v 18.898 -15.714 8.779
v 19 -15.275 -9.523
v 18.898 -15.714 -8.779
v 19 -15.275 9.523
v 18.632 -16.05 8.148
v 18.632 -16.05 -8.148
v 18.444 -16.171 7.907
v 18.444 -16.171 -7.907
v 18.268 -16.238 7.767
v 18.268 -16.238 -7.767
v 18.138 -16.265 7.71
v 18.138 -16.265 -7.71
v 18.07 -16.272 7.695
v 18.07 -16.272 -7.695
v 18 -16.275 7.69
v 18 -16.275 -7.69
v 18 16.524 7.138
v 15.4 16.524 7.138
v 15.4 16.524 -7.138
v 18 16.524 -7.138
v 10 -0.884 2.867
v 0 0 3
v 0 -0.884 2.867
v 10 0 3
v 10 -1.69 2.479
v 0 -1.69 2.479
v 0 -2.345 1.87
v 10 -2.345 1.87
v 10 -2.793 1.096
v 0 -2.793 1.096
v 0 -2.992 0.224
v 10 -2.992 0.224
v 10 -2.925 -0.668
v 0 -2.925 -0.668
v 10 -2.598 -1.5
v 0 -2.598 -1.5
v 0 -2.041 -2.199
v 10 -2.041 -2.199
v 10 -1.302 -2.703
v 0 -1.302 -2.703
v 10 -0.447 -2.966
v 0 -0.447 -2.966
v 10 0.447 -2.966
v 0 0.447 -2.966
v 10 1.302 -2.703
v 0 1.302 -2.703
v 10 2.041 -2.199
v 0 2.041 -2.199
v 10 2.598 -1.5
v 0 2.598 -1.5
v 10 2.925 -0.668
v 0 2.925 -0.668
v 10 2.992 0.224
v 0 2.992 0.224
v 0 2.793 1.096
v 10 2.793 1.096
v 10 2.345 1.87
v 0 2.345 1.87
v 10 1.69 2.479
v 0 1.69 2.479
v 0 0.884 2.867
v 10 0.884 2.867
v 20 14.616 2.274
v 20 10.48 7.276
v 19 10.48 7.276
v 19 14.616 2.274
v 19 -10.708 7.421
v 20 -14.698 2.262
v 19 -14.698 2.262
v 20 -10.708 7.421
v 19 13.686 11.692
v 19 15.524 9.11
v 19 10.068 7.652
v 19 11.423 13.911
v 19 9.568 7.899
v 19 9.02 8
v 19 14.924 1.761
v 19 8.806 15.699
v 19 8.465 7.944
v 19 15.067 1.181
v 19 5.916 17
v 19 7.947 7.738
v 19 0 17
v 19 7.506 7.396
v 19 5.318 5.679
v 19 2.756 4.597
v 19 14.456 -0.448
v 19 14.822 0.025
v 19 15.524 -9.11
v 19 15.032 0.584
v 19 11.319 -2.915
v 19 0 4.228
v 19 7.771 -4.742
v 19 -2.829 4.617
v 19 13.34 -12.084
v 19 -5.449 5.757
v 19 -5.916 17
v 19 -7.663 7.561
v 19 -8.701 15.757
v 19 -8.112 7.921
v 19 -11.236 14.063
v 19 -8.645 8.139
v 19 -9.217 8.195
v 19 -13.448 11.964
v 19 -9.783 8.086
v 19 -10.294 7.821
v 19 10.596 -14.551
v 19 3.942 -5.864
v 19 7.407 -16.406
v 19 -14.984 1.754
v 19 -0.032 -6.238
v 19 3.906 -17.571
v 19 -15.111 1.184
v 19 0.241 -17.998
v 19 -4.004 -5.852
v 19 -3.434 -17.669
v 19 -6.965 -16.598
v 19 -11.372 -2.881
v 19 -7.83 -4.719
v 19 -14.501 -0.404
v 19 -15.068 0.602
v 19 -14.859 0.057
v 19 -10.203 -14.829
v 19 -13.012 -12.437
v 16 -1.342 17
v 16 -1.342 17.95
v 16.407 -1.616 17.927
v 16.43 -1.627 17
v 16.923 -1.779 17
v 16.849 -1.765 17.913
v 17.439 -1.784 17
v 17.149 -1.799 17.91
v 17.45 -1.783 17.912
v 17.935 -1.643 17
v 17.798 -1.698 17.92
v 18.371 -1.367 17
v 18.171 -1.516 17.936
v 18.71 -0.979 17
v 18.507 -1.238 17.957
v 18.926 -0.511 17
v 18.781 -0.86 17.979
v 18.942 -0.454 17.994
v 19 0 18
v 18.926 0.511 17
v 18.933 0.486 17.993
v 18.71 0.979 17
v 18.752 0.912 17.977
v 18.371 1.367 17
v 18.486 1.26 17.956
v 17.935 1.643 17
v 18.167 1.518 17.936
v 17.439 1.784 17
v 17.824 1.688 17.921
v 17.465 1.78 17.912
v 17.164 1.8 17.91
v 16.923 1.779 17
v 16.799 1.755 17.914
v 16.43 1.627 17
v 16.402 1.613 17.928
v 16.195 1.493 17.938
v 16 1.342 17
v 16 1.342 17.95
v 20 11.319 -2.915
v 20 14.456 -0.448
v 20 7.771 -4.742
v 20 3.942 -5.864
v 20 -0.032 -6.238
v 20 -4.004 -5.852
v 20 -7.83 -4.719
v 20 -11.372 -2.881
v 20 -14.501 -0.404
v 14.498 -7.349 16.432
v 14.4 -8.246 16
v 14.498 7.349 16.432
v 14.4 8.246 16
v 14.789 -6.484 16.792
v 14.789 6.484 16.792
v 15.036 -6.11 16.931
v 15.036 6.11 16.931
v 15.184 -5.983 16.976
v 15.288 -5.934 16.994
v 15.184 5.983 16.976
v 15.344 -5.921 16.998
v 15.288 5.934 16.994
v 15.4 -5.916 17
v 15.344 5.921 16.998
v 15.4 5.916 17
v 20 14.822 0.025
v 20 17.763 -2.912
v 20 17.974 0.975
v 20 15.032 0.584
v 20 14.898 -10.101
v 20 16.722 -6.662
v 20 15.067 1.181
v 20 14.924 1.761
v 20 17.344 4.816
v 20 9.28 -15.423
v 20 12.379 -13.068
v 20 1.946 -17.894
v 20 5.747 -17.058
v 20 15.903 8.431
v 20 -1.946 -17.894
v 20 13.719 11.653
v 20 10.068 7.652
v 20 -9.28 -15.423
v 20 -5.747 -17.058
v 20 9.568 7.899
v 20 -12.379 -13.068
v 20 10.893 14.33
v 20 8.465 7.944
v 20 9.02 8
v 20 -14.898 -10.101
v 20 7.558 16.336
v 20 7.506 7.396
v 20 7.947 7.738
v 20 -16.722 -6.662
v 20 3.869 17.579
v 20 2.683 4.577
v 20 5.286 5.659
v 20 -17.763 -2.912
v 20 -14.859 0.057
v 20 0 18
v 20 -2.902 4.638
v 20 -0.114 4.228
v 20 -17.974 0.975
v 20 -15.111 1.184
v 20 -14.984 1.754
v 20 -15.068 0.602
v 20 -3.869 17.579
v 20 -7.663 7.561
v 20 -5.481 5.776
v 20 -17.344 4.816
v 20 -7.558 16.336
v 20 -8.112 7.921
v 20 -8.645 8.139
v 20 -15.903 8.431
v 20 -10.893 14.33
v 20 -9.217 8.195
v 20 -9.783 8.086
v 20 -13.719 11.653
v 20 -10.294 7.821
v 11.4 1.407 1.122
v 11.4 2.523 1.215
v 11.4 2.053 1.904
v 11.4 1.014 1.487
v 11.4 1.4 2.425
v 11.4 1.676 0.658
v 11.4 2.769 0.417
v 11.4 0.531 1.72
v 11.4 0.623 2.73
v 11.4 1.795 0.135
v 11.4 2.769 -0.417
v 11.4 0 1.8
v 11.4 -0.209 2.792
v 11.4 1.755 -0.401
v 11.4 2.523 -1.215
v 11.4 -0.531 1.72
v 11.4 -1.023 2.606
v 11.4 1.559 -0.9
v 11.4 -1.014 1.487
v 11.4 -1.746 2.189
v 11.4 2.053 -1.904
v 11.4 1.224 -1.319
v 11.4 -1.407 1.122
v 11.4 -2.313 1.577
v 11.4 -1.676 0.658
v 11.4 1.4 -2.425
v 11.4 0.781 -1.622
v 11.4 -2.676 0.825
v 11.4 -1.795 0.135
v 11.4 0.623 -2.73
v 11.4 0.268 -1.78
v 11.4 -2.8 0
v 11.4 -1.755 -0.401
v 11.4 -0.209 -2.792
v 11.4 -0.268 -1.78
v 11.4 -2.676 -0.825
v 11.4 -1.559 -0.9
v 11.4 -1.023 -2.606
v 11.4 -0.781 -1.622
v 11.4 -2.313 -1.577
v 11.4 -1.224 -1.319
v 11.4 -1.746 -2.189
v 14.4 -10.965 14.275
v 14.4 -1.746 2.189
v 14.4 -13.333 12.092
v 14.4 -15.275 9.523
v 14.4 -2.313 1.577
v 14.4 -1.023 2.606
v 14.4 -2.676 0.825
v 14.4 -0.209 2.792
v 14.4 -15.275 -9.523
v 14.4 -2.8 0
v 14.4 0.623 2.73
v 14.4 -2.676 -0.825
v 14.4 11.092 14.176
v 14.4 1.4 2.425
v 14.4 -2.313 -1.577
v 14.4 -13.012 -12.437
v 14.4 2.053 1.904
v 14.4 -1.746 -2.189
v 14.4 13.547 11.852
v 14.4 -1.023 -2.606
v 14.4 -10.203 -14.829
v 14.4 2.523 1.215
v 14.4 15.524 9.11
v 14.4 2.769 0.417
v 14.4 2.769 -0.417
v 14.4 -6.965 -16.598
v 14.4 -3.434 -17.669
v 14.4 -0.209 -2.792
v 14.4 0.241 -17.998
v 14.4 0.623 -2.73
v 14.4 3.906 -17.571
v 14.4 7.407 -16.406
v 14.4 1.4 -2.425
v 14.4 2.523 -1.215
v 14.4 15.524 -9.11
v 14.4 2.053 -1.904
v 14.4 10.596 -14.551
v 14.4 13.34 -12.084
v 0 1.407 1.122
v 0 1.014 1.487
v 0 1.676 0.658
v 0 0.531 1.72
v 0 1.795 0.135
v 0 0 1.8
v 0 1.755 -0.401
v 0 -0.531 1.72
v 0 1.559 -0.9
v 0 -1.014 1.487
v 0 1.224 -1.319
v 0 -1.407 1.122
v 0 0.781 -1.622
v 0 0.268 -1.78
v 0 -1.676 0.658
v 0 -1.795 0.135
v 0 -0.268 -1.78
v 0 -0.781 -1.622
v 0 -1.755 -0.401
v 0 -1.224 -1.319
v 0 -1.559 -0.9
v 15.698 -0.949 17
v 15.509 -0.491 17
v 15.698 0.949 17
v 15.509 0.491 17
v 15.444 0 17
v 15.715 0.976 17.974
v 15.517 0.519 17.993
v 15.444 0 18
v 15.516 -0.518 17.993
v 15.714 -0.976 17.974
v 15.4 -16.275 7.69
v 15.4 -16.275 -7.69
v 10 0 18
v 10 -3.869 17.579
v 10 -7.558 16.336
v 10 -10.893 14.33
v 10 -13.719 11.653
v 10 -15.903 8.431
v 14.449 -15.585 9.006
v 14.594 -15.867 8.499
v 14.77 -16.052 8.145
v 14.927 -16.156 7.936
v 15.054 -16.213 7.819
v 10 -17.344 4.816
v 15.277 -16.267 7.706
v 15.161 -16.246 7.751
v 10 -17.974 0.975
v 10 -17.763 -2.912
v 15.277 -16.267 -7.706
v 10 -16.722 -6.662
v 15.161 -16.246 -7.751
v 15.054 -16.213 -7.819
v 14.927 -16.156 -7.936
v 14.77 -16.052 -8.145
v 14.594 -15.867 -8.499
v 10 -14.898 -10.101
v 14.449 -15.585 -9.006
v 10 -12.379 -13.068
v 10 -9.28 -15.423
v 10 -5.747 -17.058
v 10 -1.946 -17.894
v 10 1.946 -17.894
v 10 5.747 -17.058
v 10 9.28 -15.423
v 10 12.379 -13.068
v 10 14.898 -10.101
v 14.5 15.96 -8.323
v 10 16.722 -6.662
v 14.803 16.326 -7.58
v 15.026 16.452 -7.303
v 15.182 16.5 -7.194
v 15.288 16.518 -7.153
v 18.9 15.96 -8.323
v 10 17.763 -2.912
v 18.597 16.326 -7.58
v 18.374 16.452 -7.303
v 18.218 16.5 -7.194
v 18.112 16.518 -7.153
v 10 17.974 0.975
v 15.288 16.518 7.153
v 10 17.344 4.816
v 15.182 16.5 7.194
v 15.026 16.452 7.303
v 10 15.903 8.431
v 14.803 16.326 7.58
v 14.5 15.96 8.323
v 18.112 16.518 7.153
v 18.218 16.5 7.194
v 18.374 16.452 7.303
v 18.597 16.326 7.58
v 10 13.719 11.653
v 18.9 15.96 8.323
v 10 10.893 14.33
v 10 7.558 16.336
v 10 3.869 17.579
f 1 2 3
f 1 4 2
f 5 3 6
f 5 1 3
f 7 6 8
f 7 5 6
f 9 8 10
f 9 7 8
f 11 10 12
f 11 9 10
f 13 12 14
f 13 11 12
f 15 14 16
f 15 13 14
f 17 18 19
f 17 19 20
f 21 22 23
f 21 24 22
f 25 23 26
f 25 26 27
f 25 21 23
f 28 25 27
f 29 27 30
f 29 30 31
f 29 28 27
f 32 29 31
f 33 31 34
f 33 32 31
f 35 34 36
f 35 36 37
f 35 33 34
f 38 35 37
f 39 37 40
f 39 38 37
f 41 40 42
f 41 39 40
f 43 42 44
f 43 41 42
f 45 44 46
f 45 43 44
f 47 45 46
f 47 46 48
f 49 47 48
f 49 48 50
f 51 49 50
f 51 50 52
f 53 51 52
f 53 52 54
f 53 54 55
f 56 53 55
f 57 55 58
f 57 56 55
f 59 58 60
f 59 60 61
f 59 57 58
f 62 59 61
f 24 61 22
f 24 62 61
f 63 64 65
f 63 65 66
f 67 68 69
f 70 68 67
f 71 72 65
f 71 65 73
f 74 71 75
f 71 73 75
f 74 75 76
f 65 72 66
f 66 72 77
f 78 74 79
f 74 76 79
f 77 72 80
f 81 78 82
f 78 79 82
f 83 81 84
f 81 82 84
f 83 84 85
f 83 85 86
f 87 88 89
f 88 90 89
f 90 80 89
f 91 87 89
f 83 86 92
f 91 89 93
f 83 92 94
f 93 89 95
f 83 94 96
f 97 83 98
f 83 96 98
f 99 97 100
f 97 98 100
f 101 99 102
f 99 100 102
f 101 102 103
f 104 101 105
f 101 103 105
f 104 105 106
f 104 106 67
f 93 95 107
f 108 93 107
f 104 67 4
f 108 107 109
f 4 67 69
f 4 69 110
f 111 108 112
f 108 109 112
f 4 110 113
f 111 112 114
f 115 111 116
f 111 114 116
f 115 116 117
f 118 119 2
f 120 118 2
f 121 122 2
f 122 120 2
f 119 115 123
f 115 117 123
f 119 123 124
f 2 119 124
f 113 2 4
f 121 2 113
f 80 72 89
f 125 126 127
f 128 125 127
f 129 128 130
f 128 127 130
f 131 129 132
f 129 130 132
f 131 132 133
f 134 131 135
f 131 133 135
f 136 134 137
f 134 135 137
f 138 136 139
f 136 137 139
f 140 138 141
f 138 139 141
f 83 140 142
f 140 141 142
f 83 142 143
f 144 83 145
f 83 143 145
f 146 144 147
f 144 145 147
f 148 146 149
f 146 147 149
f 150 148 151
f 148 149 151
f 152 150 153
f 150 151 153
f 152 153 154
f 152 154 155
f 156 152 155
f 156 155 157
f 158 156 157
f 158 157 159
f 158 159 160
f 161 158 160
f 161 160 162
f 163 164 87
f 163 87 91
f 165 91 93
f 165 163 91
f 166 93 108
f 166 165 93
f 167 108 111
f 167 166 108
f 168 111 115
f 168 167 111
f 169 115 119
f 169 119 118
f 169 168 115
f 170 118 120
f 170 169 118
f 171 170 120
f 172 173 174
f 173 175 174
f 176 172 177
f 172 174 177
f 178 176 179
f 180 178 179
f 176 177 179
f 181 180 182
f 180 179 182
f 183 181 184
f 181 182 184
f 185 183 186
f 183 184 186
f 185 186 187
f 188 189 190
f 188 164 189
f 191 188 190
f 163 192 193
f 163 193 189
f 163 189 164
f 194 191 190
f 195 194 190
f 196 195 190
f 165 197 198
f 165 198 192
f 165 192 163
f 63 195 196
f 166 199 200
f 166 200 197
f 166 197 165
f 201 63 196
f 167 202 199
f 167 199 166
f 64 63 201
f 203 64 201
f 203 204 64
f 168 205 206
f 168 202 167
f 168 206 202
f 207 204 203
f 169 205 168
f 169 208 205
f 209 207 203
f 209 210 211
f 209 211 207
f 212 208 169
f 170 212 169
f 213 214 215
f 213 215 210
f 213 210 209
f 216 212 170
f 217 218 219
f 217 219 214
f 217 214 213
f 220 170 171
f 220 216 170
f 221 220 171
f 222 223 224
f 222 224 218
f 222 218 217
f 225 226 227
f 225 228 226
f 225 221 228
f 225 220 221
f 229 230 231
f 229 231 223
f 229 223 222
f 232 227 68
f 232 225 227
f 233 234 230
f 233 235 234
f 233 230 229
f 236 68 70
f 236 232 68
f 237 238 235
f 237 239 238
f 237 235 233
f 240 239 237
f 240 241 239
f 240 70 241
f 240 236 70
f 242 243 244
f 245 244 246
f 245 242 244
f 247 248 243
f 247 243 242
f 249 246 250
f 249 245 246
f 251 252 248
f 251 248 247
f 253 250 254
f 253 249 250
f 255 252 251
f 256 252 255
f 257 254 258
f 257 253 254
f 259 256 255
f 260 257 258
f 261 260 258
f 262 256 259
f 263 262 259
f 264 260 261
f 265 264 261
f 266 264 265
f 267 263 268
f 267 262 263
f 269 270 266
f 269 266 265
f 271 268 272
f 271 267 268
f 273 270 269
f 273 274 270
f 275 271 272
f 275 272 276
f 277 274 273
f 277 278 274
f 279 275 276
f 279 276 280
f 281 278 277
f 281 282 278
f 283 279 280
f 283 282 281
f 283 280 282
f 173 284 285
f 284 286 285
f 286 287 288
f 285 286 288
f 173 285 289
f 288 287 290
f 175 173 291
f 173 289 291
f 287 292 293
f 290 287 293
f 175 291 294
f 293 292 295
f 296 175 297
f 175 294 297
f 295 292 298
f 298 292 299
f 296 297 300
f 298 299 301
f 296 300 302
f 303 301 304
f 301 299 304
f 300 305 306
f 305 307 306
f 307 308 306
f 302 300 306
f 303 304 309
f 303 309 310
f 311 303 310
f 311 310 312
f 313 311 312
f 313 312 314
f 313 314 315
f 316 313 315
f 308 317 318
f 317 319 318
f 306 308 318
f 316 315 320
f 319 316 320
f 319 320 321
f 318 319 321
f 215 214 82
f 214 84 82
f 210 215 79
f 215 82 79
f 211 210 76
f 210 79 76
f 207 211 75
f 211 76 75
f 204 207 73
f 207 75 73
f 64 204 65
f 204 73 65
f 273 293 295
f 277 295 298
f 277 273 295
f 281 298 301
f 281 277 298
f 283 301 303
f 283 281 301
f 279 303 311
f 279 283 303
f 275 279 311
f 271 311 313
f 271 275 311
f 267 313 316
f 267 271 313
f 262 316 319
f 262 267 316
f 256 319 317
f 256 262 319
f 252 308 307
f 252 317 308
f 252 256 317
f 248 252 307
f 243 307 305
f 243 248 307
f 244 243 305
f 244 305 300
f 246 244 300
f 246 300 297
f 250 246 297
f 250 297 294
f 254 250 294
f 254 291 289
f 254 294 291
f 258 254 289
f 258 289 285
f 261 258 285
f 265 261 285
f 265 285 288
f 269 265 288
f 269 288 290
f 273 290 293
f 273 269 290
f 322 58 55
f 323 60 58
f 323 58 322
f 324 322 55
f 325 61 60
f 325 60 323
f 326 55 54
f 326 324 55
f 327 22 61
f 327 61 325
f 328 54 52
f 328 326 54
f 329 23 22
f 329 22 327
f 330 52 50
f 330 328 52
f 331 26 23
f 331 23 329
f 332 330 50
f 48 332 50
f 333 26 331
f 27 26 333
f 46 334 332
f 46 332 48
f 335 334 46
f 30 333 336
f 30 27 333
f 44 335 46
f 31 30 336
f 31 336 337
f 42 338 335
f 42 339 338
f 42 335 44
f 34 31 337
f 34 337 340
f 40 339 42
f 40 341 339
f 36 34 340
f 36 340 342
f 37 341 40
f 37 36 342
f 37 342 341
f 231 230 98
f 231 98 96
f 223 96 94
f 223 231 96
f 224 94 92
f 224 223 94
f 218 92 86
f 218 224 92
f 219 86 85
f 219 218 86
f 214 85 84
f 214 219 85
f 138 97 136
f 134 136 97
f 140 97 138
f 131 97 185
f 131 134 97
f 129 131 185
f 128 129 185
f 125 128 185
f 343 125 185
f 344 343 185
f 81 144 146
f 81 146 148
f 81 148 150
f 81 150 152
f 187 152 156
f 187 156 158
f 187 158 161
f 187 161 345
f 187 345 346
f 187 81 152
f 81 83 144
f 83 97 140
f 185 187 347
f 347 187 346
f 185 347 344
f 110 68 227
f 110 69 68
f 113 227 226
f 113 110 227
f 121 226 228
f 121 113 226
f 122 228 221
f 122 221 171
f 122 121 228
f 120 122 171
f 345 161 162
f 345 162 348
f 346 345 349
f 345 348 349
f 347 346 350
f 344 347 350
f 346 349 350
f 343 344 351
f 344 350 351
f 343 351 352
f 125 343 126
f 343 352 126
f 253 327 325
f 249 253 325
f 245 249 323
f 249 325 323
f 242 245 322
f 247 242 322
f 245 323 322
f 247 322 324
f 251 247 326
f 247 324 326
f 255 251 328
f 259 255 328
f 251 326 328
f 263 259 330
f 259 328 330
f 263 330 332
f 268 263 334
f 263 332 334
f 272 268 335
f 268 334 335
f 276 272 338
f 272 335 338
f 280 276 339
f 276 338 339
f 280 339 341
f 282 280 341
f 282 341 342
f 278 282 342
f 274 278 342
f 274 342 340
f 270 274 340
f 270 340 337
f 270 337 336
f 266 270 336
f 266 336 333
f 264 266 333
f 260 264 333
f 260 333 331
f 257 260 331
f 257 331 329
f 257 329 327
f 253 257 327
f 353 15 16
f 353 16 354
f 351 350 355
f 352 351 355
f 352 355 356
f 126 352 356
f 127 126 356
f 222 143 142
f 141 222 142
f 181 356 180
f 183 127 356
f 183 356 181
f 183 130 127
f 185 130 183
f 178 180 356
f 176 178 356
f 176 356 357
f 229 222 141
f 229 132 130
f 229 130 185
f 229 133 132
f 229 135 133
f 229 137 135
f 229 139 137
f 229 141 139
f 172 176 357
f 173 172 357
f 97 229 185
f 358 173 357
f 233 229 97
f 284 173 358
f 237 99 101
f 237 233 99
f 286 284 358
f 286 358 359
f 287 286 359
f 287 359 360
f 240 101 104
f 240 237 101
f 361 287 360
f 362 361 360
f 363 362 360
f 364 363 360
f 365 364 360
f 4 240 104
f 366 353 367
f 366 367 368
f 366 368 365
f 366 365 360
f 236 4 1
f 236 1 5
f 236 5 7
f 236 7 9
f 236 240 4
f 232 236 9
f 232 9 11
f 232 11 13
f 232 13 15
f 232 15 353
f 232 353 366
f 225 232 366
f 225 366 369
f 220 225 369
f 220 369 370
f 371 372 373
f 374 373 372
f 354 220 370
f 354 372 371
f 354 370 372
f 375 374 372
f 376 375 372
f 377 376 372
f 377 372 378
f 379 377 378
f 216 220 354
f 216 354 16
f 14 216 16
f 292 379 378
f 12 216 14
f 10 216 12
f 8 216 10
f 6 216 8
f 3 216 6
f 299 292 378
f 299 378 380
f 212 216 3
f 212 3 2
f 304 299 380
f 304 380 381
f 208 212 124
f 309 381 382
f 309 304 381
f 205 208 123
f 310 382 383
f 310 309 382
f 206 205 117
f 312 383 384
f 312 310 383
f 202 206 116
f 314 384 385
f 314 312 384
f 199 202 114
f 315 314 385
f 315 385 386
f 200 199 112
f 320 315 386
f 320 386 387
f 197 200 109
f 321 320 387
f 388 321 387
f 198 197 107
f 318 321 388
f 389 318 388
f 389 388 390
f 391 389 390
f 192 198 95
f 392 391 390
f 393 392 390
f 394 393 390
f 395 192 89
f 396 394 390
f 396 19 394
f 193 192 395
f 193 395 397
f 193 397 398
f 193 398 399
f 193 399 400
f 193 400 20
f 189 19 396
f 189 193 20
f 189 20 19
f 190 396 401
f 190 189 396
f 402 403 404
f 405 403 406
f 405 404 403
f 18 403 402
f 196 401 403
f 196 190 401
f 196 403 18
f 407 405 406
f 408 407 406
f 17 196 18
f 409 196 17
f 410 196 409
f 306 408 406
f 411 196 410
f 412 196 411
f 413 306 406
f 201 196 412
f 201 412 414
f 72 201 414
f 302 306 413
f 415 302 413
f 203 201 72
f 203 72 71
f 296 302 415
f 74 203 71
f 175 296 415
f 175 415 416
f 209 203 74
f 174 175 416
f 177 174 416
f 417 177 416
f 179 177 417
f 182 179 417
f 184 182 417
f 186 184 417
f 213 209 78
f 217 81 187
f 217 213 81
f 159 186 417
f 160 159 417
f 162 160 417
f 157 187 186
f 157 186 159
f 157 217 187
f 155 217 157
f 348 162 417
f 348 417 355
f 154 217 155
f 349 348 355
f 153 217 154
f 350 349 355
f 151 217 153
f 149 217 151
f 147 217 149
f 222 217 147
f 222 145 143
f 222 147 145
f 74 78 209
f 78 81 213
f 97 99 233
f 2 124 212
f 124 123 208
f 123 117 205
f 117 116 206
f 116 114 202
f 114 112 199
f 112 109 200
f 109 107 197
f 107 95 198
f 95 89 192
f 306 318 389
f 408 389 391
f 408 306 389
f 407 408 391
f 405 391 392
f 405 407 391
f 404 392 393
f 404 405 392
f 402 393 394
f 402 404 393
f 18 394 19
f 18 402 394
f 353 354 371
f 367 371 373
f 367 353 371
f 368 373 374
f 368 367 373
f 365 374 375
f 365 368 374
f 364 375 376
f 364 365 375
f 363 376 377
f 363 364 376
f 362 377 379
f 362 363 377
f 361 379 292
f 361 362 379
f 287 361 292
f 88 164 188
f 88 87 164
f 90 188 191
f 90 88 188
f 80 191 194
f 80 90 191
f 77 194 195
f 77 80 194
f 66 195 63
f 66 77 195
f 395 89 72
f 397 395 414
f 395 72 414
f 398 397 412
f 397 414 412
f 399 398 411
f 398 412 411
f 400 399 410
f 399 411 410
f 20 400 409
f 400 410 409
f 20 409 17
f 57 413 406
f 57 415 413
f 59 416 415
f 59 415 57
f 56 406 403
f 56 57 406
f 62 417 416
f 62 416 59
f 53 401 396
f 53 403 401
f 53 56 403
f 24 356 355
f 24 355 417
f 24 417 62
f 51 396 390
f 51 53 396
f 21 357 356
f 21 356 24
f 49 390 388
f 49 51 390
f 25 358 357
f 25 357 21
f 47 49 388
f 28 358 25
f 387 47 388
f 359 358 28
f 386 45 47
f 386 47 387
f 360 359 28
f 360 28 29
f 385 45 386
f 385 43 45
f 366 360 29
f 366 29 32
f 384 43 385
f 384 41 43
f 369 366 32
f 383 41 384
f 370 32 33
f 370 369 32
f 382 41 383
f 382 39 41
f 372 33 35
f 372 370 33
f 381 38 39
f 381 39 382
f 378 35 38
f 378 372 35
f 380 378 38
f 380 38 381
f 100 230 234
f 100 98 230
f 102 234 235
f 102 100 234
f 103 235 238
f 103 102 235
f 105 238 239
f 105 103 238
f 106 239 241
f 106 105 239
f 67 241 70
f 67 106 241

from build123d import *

# Parameters (mm, degrees)
CORTAR_EXTRUIR1_DEPTH      = 1
CORTAR_EXTRUIR3_DEPTH      = 35
CORTAR_EXTRUIR4_DEPTH      = 24
CORTAR_EXTRUIR5_REACH      = 34.373
CROQUIS6_R                 = 1.8
CORTAR_EXTRUIR6_DEPTH      = 30.24653838
CORTAR_EXTRUIR6_DEPTH_BACK = 3
CROQUIS7_R                 = 2.8
REDONDEO1_R                = 2
REDONDEO2_R                = 1
REDONDEO3_R                = 1


with BuildPart() as part:
    # Croquis1 → Revolución1 (revolve)
    with BuildSketch(Plane.XY, mode=Mode.PRIVATE) as revoluci_n1_sk:
        Polygon((0, 0), (0, 3), (10, 3), (10, 18), (20, 18), (20, 0), align=None)
    revolve(revoluci_n1_sk.sketch.rotate(Axis((-25.36492891, 0, 0), (1, 0, 0)), 90), axis=Axis((-25.36492891, 0, 0), (1, 0, 0)))

    # Croquis2 → Cortar-Extruir1 (cut)
    with BuildSketch(Plane(origin=(20, 0, 0), x_dir=(0, 0, -1), z_dir=(1, 0, 0))):
        with BuildLine():
            Line((-9.183440496, 8.902465622), (-0.902762127, 15.75))
            ThreePointArc((-0.902762127, 15.75), (6.237962948, 0), (-0.902762127, -15.75))
            Line((-0.902762127, -15.75), (-9.50624249, -9.09463967))
            ThreePointArc((-9.50624249, -9.09463967), (-4.229487685, -0.187837691), (-9.183440496, 8.902465622))
        make_face()
    extrude(amount=-CORTAR_EXTRUIR1_DEPTH, mode=Mode.SUBTRACT)

    # Croquis4 → Cortar-Extruir3 (cut)
    with BuildSketch(Plane(origin=(0, 0, -18), x_dir=(-1, 0, 0), z_dir=(0, 0, -1))):
        Polygon((-19, 15.75), (-19, 8.902465622), (-19, -9.09463967), (-19, -15.75), (-19, -16.274754547), (-14.4, -16.274754547), (-14.4, 16.524155196), (-19, 16.524155196), align=None)
    extrude(amount=-CORTAR_EXTRUIR3_DEPTH, mode=Mode.SUBTRACT)

    # Croquis5 → Cortar-Extruir4 (cut)
    with BuildSketch(Plane.XY.offset(18)):
        with BuildLine():
            ThreePointArc((16, -1.341640786), (19, 0), (16, 1.341640786))
            ThreePointArc((16, 1.341640786), (15.44427419, 0), (16, -1.341640786))
        make_face()
    extrude(amount=-CORTAR_EXTRUIR4_DEPTH, mode=Mode.SUBTRACT)

    # Croquis6 → Cortar-Extruir5 (cut, up to next)
    with BuildSketch(Plane.ZY, mode=Mode.PRIVATE) as cortar_extruir5_sk1:
        Circle(CROQUIS6_R)
    cortar_extruir5_tool1 = extrude(cortar_extruir5_sk1.sketch, amount=-CORTAR_EXTRUIR5_REACH, mode=Mode.PRIVATE) & part.part
    add(cortar_extruir5_tool1.solids().sort_by_distance((0, 0, 0))[0], mode=Mode.SUBTRACT)

    # Croquis7 → Cortar-Extruir6 (cut, two sides: drawn at the far end of the back side and taken through both)
    with BuildSketch(Plane(origin=(14.4, 0, 0), x_dir=(0, 0, -1), z_dir=(1, 0, 0)).offset(-CORTAR_EXTRUIR6_DEPTH_BACK)):
        with Locations(Location((0, 0, 0), (0, 0, 270))):
            Circle(CROQUIS7_R)
    extrude(amount=CORTAR_EXTRUIR6_DEPTH + CORTAR_EXTRUIR6_DEPTH_BACK, mode=Mode.SUBTRACT)

    # Redondeo1
    redondeo1_edges = [part.edges().sort_by_distance(p)[0] for p in [
        (19.5, 15.75, 0.902762127),
        (19.5, -15.75, 0.902762127),
        (19.5, -9.09463967, 9.50624249),
        (19.5, 8.902465622, 9.183440496),
    ]]
    fillet(redondeo1_edges, radius=REDONDEO1_R)

    # Redondeo2
    redondeo2_edges = [part.edges().sort_by_distance(p)[0] for p in [
        (19, 16.524155196, 0),
        (14.4, 16.524155196, 0),
        (14.4, -16.274754547, 0),
        (19, -16.274754547, 0),
    ]]
    fillet(redondeo2_edges, radius=REDONDEO2_R)

    # Redondeo3
    redondeo3_edges = [part.edges().sort_by_distance(p)[0] for p in [
        (14.4, 0, 17),
    ]]
    fillet(redondeo3_edges, radius=REDONDEO3_R)


solid = part.part
